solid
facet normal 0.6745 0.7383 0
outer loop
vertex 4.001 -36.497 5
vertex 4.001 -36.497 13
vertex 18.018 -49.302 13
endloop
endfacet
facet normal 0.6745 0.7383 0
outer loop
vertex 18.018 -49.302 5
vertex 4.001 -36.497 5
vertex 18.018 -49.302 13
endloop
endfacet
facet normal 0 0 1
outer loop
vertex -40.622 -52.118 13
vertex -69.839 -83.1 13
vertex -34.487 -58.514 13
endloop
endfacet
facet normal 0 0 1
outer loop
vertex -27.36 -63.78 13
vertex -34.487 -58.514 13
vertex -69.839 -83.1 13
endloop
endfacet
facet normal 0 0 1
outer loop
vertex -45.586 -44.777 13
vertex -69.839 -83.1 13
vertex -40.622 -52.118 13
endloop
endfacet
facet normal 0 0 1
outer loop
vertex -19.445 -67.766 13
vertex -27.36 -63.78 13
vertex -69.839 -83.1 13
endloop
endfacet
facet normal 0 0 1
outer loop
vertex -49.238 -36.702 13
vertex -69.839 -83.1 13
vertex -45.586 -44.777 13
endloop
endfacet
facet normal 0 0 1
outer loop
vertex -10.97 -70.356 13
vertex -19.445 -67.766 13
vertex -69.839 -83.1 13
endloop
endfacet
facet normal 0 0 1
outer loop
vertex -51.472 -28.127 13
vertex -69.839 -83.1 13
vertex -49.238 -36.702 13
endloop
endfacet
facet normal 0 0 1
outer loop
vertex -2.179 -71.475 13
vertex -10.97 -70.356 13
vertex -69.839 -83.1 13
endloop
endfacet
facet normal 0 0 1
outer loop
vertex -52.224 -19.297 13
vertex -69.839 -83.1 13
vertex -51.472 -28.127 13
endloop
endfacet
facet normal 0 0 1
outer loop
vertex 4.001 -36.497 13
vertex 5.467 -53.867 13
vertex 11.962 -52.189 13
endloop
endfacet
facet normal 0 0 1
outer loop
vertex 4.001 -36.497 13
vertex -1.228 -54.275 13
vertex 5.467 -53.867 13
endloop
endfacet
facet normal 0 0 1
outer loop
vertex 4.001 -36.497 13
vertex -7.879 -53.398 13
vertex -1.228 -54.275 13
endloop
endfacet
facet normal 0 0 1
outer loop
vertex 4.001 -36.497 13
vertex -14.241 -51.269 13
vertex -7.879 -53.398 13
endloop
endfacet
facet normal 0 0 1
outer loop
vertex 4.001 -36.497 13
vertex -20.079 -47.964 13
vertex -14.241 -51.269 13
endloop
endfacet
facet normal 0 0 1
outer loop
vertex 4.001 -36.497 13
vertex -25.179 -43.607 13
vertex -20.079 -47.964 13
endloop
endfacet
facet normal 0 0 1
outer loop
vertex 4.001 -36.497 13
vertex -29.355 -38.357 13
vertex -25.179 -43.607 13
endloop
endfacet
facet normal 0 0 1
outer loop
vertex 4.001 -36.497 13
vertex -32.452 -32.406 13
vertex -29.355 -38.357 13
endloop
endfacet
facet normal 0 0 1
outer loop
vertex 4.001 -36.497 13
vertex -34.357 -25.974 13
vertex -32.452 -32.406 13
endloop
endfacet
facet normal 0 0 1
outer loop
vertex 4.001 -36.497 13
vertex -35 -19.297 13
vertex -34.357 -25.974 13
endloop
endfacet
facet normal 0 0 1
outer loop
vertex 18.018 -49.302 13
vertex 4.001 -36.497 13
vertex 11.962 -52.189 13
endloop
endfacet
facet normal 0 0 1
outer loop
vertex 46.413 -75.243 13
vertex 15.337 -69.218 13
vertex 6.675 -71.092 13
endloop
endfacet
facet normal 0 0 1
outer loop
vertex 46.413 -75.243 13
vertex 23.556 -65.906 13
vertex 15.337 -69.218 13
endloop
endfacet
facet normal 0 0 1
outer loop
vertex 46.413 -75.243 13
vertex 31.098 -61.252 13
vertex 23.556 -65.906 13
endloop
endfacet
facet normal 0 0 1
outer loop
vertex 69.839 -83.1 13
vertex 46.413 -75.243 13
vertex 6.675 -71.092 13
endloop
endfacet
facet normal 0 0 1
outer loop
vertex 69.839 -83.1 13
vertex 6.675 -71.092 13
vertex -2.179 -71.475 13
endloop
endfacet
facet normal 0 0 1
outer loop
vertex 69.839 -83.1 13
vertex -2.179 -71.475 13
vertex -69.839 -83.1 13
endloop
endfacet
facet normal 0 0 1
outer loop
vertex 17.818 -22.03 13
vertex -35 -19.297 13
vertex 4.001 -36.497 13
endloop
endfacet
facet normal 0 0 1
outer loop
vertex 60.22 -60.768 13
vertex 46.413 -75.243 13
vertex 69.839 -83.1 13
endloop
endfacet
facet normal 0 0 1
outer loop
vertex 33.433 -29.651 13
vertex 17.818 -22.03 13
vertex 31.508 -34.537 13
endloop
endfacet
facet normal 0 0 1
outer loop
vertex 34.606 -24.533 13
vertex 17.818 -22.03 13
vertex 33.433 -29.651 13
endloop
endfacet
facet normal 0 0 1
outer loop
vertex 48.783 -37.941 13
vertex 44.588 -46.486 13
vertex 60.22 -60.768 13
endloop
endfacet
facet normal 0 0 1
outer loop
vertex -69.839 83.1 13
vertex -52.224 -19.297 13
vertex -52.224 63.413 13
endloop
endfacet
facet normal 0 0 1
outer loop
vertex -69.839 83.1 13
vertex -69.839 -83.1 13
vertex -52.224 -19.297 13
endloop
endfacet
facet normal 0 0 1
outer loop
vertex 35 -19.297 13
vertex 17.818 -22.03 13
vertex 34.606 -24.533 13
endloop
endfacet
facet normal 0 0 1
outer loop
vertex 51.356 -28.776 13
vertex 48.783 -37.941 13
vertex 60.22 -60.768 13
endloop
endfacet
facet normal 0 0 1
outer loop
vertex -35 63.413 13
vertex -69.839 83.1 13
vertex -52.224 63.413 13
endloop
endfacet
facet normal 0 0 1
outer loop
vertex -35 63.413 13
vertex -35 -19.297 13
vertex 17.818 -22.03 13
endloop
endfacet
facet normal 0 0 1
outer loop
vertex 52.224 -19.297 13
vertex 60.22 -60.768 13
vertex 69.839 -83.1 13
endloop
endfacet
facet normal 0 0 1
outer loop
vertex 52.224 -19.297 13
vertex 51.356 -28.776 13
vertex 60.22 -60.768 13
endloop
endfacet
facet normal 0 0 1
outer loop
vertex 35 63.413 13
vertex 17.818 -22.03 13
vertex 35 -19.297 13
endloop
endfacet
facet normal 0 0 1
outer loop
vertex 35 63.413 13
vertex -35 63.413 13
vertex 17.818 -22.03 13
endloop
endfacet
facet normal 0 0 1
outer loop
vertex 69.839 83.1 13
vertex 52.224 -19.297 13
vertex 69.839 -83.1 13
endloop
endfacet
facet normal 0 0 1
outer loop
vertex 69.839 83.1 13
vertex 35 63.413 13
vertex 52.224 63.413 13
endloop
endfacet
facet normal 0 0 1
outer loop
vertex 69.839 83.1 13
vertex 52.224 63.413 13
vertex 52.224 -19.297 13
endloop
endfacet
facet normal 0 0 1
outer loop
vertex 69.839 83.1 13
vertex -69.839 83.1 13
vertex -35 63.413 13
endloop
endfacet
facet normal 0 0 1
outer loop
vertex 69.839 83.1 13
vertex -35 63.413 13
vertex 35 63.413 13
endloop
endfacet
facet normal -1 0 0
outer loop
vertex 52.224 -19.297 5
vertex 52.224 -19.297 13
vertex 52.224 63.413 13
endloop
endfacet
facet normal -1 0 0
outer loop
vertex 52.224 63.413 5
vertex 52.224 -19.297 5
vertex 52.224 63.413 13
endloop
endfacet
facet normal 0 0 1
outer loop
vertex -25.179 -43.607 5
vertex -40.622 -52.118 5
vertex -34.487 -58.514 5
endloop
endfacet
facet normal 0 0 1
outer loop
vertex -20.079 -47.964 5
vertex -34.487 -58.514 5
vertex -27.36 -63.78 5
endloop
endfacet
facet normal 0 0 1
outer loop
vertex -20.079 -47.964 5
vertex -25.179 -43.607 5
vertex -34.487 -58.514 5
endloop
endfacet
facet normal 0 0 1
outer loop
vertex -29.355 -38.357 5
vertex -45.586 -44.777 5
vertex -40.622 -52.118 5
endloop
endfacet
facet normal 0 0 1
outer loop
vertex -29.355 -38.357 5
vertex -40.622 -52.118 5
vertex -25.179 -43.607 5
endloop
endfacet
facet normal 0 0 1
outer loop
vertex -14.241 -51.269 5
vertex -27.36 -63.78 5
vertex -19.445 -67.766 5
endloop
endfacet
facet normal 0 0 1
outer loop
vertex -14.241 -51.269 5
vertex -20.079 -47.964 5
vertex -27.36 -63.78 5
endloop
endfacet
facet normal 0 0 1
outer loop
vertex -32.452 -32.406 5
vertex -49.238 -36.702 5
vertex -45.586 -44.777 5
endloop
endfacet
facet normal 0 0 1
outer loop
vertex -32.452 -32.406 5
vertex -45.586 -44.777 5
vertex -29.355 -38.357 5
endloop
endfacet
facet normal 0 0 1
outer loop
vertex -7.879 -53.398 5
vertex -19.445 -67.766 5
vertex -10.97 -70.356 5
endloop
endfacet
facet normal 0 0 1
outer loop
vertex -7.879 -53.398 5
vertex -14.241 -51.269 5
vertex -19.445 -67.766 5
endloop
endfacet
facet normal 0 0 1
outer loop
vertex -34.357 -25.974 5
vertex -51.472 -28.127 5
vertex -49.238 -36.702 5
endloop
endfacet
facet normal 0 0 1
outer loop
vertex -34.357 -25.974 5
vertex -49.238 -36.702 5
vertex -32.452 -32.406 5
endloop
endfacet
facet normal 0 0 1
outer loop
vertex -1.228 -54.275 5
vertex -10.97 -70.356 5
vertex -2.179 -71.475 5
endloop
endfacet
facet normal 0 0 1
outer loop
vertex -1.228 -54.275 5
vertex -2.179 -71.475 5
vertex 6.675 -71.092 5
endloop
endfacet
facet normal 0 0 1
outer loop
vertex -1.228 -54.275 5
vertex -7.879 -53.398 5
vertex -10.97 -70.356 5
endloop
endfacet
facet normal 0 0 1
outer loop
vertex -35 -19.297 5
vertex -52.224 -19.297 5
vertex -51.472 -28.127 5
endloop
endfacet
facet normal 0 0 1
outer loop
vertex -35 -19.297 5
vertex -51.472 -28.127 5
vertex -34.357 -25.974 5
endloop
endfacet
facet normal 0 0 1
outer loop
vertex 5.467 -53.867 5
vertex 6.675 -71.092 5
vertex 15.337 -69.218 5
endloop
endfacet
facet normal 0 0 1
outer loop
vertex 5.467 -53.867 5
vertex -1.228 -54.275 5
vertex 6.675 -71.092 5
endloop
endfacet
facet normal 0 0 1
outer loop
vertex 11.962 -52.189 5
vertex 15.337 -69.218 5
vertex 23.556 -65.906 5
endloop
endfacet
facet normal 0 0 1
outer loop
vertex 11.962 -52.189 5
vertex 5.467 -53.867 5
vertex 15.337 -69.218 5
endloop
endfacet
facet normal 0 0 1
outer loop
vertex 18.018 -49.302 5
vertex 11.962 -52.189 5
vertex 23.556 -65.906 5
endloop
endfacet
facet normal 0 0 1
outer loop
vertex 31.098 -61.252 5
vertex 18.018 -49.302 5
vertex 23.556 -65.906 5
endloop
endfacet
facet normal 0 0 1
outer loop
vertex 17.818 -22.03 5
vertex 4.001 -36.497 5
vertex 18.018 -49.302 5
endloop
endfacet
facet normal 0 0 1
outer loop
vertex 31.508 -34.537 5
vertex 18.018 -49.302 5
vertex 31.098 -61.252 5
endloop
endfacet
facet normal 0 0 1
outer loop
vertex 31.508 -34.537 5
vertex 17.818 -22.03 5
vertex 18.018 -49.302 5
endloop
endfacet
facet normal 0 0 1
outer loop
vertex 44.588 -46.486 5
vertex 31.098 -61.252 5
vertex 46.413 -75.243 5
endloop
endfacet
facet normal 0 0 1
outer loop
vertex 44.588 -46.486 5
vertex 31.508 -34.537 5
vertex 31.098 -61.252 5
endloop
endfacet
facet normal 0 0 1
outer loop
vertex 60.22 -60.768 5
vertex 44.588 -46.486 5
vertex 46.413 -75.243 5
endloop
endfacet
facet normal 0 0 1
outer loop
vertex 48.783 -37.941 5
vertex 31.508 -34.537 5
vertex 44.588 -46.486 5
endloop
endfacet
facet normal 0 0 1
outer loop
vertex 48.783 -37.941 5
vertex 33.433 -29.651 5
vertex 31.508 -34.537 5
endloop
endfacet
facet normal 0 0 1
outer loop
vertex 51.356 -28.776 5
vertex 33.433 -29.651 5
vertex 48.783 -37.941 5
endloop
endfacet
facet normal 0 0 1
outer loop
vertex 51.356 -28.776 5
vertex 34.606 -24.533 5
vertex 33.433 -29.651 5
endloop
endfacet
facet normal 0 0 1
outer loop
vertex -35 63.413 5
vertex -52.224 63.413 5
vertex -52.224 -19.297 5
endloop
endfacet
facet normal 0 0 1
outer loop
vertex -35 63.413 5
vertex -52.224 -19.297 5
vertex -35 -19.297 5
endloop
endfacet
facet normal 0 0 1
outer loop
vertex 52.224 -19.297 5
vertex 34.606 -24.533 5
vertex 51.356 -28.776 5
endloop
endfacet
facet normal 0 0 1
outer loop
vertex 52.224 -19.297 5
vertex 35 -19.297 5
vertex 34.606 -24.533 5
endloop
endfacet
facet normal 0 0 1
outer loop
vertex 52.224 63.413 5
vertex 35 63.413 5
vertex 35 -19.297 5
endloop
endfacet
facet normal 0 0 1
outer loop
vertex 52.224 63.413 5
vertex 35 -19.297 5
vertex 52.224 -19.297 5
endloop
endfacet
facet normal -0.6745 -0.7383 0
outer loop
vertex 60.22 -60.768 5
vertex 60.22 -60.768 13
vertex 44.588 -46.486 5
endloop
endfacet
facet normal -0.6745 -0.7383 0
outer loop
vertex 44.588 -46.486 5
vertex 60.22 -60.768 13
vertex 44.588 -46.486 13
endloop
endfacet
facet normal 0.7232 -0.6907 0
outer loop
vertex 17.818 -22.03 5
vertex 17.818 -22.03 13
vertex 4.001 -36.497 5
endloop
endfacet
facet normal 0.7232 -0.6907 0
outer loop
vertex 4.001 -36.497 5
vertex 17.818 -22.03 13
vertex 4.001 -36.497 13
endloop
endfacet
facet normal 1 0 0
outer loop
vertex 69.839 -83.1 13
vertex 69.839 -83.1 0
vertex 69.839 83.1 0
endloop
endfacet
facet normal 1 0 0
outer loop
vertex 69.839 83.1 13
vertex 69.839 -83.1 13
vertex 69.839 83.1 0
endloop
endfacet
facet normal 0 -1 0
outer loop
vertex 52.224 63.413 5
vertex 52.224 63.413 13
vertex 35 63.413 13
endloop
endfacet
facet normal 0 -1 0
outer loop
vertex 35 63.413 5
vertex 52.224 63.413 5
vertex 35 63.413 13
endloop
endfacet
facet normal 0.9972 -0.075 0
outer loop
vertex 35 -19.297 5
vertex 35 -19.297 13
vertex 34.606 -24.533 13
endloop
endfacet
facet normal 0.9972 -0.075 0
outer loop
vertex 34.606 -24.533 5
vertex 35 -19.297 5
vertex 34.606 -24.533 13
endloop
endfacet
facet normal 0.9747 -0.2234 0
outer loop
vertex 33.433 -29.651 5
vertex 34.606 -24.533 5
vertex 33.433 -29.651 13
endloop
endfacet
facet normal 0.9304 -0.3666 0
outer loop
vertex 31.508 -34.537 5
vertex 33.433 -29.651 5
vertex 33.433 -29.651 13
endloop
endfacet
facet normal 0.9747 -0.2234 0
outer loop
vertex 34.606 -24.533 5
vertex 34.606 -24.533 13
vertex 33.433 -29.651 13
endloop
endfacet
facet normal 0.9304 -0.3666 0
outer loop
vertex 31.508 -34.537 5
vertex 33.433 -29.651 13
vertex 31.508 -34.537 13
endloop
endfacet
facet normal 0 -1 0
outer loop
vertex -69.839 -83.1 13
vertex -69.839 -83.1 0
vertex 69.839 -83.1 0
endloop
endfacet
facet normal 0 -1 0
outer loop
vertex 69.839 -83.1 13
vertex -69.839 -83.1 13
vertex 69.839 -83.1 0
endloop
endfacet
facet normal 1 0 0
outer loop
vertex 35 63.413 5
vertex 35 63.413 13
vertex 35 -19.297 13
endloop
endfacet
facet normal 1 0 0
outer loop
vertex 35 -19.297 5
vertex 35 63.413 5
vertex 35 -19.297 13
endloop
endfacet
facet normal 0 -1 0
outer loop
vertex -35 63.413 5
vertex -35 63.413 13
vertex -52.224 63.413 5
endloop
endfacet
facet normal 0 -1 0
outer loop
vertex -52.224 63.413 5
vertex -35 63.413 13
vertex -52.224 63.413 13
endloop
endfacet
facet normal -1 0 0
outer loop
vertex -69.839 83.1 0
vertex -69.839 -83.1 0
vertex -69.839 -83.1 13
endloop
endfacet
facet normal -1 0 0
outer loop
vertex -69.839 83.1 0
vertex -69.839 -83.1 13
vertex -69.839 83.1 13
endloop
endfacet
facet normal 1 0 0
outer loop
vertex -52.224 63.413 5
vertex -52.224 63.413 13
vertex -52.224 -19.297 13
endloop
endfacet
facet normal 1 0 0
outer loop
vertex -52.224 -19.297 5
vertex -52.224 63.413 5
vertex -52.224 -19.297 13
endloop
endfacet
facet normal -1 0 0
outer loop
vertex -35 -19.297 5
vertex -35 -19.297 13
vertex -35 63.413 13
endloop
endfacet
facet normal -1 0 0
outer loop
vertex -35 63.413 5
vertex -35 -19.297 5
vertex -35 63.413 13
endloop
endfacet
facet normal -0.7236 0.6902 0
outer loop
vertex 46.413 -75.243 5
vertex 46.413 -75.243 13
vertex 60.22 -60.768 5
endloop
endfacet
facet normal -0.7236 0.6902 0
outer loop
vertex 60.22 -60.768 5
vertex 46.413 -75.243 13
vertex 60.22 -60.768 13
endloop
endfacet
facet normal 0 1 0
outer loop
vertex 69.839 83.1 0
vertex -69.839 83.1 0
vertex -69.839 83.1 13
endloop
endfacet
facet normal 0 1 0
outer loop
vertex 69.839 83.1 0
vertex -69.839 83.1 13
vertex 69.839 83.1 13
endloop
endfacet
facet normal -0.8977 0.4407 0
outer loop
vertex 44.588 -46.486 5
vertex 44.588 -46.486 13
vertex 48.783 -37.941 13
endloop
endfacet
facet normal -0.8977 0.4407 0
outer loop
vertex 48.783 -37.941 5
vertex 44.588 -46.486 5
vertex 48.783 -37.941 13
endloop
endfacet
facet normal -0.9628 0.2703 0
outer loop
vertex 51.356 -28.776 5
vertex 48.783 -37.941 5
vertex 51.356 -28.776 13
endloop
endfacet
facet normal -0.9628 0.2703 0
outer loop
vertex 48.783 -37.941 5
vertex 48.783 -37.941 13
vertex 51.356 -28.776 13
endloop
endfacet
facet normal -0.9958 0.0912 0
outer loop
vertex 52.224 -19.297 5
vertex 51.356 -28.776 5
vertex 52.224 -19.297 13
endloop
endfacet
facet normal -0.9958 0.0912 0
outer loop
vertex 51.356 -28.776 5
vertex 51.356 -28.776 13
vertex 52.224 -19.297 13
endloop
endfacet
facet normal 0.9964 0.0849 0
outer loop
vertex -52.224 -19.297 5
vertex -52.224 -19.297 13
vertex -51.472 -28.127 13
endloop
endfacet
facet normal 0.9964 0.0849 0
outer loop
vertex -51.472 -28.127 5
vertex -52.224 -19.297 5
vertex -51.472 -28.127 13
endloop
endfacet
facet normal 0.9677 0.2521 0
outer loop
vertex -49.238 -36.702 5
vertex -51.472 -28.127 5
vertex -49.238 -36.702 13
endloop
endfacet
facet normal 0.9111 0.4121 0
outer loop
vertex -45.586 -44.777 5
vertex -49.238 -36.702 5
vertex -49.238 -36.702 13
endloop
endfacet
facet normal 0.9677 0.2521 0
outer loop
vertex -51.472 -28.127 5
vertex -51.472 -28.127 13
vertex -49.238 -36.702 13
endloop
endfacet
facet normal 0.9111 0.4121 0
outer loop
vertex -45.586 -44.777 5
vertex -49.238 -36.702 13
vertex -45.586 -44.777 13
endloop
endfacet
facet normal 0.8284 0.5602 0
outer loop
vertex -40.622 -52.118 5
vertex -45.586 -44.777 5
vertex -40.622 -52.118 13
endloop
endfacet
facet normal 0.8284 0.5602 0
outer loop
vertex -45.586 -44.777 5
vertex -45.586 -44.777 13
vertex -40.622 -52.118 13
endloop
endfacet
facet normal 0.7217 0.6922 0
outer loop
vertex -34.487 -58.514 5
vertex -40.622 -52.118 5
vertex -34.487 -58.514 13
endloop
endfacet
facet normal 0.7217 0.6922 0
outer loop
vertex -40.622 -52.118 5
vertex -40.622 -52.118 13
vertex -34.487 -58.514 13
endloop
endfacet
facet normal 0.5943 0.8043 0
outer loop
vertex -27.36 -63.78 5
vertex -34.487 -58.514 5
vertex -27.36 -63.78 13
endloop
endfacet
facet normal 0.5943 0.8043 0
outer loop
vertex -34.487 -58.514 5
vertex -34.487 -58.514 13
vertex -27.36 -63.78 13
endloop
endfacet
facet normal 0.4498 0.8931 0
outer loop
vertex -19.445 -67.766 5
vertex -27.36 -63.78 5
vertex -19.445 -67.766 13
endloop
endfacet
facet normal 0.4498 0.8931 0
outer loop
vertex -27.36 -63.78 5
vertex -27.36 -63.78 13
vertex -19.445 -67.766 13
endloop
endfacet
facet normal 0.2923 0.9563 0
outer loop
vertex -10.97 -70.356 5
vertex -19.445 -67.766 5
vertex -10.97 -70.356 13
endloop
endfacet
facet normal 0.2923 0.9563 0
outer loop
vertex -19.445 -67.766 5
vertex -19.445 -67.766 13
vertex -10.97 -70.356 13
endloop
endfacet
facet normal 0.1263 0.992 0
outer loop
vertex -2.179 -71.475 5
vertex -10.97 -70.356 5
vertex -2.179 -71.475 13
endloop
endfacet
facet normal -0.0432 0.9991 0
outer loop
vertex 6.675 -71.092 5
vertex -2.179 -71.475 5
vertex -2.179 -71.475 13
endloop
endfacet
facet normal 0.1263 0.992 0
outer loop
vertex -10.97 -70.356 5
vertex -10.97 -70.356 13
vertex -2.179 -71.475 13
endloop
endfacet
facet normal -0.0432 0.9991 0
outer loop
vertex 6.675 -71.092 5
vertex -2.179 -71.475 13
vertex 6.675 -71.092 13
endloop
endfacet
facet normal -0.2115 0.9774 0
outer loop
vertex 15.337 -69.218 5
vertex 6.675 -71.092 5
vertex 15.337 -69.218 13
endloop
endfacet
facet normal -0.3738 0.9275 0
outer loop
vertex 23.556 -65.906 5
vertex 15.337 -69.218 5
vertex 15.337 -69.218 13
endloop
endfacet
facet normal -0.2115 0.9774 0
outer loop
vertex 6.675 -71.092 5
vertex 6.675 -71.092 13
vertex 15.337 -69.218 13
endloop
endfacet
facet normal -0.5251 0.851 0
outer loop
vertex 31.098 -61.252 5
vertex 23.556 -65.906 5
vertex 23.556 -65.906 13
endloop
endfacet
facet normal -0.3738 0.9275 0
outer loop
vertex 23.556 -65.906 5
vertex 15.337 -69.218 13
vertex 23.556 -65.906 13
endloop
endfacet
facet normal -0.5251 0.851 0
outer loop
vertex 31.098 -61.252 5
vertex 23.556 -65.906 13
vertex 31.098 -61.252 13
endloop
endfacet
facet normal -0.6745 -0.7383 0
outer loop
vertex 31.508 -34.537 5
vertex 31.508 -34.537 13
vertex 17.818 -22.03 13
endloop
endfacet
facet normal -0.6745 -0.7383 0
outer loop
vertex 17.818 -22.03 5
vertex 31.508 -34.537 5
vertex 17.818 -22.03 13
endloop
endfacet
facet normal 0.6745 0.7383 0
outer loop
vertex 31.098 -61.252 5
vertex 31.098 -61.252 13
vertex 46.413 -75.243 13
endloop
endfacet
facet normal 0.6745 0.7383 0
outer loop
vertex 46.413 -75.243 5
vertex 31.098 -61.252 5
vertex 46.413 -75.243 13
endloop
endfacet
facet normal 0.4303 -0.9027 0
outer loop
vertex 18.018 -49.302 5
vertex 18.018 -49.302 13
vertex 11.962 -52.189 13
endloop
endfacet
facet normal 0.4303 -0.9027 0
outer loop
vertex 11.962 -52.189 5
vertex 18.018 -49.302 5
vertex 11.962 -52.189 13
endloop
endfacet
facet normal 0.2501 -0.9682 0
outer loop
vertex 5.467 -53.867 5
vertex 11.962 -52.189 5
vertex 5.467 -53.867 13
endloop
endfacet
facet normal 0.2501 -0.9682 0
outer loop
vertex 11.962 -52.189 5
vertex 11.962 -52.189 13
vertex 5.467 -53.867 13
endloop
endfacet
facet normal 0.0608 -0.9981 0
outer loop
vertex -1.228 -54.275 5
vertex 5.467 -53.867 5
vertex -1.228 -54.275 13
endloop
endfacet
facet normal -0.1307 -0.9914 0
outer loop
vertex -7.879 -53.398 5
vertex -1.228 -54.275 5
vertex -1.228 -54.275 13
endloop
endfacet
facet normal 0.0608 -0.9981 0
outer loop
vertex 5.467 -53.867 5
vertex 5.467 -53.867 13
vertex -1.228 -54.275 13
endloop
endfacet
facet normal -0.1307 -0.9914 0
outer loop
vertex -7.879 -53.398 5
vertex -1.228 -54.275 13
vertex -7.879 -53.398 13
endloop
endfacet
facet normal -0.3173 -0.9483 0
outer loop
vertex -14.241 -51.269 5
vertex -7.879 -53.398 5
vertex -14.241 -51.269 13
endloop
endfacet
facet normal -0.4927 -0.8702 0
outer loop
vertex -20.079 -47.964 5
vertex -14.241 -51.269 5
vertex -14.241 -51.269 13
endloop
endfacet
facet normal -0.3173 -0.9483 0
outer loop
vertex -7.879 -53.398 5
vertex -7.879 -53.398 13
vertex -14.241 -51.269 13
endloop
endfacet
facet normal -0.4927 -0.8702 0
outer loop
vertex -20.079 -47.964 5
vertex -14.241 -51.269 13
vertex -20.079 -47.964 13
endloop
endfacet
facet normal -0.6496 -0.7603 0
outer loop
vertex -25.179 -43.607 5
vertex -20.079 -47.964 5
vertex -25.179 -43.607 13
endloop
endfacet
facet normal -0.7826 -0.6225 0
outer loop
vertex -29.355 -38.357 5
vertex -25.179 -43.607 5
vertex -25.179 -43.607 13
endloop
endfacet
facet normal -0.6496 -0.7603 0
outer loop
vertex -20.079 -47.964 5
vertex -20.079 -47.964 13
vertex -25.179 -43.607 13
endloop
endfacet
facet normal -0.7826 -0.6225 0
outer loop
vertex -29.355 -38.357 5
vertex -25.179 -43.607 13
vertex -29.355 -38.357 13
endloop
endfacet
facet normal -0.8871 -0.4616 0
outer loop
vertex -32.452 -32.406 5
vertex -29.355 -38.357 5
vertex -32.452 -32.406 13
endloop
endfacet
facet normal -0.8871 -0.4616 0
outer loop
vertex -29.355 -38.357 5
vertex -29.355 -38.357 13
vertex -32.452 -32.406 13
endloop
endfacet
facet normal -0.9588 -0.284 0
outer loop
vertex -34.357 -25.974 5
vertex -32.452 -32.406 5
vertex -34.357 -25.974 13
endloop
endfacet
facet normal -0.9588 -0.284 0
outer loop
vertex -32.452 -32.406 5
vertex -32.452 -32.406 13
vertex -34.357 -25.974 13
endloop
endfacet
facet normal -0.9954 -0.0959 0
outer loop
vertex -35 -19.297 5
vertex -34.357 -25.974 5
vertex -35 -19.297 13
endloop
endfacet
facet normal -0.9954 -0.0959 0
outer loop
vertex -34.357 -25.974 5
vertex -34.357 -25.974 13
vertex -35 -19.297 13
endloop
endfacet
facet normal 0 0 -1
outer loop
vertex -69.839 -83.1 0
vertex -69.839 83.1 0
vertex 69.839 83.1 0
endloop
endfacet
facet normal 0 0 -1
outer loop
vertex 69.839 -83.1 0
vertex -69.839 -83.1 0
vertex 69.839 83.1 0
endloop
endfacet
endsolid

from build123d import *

# Parameters (mm, degrees)
F0_W     = 139.677039
F0_H     = 166.199392
F1_DEPTH = 13
F3_DEPTH = 8


# Not quite as in the source:
# - ends of sketch curves that miss each other by under 0.0002 mm in the source are joined


with BuildPart() as f1:
    # F0 (on Top) → F1 (new body)
    with BuildSketch(Plane.XY):
        with Locations((5e-07, 0)):
            Rectangle(F0_W, F0_H)
    extrude(amount=F1_DEPTH)

    # F2 (on face) → F3 (cut)
    with BuildSketch(Plane.XY.offset(13)):
        with BuildLine():
            Line((-52.224, 63.413361), (-52.224, -19.296639))
            ThreePointArc((-52.224, -19.296639), (-23.4870244983, -65.9411012245), (31.0980686358, -61.2520475086))
            Line((31.0980686358, -61.2520475086), (46.412829, -75.243303))
            Line((46.412829, -75.243303), (60.220039, -60.767602))
            Line((60.220039, -60.767602), (44.587774, -46.486281))
            ThreePointArc((44.587774, -46.486281), (50.2787135157, -33.4174443314), (52.224, -19.296639))
            Line((52.224, -19.296639), (52.224, 63.413361))
            Line((52.224, 63.413361), (35, 63.413361))
            Line((35, 63.413361), (35, -19.296639))
            ThreePointArc((35, -19.296639), (34.1157796878, -27.1141562719), (31.5077956402, -34.536678826))
            Line((31.5077956402, -34.536678826), (17.818477, -22.030395))
            Line((17.818477, -22.030395), (4.000974, -36.496692))
            Line((4.000974, -36.496692), (18.018091, -49.302445))
            ThreePointArc((18.018091, -49.302445), (-17.2390082984, -49.756720958), (-35, -19.296639))
            Line((-35, -19.296639), (-35, 63.413361))
            Line((-35, 63.413361), (-52.224, 63.413361))
        make_face()
    extrude(amount=-F3_DEPTH, mode=Mode.SUBTRACT)


solid = f1.part
